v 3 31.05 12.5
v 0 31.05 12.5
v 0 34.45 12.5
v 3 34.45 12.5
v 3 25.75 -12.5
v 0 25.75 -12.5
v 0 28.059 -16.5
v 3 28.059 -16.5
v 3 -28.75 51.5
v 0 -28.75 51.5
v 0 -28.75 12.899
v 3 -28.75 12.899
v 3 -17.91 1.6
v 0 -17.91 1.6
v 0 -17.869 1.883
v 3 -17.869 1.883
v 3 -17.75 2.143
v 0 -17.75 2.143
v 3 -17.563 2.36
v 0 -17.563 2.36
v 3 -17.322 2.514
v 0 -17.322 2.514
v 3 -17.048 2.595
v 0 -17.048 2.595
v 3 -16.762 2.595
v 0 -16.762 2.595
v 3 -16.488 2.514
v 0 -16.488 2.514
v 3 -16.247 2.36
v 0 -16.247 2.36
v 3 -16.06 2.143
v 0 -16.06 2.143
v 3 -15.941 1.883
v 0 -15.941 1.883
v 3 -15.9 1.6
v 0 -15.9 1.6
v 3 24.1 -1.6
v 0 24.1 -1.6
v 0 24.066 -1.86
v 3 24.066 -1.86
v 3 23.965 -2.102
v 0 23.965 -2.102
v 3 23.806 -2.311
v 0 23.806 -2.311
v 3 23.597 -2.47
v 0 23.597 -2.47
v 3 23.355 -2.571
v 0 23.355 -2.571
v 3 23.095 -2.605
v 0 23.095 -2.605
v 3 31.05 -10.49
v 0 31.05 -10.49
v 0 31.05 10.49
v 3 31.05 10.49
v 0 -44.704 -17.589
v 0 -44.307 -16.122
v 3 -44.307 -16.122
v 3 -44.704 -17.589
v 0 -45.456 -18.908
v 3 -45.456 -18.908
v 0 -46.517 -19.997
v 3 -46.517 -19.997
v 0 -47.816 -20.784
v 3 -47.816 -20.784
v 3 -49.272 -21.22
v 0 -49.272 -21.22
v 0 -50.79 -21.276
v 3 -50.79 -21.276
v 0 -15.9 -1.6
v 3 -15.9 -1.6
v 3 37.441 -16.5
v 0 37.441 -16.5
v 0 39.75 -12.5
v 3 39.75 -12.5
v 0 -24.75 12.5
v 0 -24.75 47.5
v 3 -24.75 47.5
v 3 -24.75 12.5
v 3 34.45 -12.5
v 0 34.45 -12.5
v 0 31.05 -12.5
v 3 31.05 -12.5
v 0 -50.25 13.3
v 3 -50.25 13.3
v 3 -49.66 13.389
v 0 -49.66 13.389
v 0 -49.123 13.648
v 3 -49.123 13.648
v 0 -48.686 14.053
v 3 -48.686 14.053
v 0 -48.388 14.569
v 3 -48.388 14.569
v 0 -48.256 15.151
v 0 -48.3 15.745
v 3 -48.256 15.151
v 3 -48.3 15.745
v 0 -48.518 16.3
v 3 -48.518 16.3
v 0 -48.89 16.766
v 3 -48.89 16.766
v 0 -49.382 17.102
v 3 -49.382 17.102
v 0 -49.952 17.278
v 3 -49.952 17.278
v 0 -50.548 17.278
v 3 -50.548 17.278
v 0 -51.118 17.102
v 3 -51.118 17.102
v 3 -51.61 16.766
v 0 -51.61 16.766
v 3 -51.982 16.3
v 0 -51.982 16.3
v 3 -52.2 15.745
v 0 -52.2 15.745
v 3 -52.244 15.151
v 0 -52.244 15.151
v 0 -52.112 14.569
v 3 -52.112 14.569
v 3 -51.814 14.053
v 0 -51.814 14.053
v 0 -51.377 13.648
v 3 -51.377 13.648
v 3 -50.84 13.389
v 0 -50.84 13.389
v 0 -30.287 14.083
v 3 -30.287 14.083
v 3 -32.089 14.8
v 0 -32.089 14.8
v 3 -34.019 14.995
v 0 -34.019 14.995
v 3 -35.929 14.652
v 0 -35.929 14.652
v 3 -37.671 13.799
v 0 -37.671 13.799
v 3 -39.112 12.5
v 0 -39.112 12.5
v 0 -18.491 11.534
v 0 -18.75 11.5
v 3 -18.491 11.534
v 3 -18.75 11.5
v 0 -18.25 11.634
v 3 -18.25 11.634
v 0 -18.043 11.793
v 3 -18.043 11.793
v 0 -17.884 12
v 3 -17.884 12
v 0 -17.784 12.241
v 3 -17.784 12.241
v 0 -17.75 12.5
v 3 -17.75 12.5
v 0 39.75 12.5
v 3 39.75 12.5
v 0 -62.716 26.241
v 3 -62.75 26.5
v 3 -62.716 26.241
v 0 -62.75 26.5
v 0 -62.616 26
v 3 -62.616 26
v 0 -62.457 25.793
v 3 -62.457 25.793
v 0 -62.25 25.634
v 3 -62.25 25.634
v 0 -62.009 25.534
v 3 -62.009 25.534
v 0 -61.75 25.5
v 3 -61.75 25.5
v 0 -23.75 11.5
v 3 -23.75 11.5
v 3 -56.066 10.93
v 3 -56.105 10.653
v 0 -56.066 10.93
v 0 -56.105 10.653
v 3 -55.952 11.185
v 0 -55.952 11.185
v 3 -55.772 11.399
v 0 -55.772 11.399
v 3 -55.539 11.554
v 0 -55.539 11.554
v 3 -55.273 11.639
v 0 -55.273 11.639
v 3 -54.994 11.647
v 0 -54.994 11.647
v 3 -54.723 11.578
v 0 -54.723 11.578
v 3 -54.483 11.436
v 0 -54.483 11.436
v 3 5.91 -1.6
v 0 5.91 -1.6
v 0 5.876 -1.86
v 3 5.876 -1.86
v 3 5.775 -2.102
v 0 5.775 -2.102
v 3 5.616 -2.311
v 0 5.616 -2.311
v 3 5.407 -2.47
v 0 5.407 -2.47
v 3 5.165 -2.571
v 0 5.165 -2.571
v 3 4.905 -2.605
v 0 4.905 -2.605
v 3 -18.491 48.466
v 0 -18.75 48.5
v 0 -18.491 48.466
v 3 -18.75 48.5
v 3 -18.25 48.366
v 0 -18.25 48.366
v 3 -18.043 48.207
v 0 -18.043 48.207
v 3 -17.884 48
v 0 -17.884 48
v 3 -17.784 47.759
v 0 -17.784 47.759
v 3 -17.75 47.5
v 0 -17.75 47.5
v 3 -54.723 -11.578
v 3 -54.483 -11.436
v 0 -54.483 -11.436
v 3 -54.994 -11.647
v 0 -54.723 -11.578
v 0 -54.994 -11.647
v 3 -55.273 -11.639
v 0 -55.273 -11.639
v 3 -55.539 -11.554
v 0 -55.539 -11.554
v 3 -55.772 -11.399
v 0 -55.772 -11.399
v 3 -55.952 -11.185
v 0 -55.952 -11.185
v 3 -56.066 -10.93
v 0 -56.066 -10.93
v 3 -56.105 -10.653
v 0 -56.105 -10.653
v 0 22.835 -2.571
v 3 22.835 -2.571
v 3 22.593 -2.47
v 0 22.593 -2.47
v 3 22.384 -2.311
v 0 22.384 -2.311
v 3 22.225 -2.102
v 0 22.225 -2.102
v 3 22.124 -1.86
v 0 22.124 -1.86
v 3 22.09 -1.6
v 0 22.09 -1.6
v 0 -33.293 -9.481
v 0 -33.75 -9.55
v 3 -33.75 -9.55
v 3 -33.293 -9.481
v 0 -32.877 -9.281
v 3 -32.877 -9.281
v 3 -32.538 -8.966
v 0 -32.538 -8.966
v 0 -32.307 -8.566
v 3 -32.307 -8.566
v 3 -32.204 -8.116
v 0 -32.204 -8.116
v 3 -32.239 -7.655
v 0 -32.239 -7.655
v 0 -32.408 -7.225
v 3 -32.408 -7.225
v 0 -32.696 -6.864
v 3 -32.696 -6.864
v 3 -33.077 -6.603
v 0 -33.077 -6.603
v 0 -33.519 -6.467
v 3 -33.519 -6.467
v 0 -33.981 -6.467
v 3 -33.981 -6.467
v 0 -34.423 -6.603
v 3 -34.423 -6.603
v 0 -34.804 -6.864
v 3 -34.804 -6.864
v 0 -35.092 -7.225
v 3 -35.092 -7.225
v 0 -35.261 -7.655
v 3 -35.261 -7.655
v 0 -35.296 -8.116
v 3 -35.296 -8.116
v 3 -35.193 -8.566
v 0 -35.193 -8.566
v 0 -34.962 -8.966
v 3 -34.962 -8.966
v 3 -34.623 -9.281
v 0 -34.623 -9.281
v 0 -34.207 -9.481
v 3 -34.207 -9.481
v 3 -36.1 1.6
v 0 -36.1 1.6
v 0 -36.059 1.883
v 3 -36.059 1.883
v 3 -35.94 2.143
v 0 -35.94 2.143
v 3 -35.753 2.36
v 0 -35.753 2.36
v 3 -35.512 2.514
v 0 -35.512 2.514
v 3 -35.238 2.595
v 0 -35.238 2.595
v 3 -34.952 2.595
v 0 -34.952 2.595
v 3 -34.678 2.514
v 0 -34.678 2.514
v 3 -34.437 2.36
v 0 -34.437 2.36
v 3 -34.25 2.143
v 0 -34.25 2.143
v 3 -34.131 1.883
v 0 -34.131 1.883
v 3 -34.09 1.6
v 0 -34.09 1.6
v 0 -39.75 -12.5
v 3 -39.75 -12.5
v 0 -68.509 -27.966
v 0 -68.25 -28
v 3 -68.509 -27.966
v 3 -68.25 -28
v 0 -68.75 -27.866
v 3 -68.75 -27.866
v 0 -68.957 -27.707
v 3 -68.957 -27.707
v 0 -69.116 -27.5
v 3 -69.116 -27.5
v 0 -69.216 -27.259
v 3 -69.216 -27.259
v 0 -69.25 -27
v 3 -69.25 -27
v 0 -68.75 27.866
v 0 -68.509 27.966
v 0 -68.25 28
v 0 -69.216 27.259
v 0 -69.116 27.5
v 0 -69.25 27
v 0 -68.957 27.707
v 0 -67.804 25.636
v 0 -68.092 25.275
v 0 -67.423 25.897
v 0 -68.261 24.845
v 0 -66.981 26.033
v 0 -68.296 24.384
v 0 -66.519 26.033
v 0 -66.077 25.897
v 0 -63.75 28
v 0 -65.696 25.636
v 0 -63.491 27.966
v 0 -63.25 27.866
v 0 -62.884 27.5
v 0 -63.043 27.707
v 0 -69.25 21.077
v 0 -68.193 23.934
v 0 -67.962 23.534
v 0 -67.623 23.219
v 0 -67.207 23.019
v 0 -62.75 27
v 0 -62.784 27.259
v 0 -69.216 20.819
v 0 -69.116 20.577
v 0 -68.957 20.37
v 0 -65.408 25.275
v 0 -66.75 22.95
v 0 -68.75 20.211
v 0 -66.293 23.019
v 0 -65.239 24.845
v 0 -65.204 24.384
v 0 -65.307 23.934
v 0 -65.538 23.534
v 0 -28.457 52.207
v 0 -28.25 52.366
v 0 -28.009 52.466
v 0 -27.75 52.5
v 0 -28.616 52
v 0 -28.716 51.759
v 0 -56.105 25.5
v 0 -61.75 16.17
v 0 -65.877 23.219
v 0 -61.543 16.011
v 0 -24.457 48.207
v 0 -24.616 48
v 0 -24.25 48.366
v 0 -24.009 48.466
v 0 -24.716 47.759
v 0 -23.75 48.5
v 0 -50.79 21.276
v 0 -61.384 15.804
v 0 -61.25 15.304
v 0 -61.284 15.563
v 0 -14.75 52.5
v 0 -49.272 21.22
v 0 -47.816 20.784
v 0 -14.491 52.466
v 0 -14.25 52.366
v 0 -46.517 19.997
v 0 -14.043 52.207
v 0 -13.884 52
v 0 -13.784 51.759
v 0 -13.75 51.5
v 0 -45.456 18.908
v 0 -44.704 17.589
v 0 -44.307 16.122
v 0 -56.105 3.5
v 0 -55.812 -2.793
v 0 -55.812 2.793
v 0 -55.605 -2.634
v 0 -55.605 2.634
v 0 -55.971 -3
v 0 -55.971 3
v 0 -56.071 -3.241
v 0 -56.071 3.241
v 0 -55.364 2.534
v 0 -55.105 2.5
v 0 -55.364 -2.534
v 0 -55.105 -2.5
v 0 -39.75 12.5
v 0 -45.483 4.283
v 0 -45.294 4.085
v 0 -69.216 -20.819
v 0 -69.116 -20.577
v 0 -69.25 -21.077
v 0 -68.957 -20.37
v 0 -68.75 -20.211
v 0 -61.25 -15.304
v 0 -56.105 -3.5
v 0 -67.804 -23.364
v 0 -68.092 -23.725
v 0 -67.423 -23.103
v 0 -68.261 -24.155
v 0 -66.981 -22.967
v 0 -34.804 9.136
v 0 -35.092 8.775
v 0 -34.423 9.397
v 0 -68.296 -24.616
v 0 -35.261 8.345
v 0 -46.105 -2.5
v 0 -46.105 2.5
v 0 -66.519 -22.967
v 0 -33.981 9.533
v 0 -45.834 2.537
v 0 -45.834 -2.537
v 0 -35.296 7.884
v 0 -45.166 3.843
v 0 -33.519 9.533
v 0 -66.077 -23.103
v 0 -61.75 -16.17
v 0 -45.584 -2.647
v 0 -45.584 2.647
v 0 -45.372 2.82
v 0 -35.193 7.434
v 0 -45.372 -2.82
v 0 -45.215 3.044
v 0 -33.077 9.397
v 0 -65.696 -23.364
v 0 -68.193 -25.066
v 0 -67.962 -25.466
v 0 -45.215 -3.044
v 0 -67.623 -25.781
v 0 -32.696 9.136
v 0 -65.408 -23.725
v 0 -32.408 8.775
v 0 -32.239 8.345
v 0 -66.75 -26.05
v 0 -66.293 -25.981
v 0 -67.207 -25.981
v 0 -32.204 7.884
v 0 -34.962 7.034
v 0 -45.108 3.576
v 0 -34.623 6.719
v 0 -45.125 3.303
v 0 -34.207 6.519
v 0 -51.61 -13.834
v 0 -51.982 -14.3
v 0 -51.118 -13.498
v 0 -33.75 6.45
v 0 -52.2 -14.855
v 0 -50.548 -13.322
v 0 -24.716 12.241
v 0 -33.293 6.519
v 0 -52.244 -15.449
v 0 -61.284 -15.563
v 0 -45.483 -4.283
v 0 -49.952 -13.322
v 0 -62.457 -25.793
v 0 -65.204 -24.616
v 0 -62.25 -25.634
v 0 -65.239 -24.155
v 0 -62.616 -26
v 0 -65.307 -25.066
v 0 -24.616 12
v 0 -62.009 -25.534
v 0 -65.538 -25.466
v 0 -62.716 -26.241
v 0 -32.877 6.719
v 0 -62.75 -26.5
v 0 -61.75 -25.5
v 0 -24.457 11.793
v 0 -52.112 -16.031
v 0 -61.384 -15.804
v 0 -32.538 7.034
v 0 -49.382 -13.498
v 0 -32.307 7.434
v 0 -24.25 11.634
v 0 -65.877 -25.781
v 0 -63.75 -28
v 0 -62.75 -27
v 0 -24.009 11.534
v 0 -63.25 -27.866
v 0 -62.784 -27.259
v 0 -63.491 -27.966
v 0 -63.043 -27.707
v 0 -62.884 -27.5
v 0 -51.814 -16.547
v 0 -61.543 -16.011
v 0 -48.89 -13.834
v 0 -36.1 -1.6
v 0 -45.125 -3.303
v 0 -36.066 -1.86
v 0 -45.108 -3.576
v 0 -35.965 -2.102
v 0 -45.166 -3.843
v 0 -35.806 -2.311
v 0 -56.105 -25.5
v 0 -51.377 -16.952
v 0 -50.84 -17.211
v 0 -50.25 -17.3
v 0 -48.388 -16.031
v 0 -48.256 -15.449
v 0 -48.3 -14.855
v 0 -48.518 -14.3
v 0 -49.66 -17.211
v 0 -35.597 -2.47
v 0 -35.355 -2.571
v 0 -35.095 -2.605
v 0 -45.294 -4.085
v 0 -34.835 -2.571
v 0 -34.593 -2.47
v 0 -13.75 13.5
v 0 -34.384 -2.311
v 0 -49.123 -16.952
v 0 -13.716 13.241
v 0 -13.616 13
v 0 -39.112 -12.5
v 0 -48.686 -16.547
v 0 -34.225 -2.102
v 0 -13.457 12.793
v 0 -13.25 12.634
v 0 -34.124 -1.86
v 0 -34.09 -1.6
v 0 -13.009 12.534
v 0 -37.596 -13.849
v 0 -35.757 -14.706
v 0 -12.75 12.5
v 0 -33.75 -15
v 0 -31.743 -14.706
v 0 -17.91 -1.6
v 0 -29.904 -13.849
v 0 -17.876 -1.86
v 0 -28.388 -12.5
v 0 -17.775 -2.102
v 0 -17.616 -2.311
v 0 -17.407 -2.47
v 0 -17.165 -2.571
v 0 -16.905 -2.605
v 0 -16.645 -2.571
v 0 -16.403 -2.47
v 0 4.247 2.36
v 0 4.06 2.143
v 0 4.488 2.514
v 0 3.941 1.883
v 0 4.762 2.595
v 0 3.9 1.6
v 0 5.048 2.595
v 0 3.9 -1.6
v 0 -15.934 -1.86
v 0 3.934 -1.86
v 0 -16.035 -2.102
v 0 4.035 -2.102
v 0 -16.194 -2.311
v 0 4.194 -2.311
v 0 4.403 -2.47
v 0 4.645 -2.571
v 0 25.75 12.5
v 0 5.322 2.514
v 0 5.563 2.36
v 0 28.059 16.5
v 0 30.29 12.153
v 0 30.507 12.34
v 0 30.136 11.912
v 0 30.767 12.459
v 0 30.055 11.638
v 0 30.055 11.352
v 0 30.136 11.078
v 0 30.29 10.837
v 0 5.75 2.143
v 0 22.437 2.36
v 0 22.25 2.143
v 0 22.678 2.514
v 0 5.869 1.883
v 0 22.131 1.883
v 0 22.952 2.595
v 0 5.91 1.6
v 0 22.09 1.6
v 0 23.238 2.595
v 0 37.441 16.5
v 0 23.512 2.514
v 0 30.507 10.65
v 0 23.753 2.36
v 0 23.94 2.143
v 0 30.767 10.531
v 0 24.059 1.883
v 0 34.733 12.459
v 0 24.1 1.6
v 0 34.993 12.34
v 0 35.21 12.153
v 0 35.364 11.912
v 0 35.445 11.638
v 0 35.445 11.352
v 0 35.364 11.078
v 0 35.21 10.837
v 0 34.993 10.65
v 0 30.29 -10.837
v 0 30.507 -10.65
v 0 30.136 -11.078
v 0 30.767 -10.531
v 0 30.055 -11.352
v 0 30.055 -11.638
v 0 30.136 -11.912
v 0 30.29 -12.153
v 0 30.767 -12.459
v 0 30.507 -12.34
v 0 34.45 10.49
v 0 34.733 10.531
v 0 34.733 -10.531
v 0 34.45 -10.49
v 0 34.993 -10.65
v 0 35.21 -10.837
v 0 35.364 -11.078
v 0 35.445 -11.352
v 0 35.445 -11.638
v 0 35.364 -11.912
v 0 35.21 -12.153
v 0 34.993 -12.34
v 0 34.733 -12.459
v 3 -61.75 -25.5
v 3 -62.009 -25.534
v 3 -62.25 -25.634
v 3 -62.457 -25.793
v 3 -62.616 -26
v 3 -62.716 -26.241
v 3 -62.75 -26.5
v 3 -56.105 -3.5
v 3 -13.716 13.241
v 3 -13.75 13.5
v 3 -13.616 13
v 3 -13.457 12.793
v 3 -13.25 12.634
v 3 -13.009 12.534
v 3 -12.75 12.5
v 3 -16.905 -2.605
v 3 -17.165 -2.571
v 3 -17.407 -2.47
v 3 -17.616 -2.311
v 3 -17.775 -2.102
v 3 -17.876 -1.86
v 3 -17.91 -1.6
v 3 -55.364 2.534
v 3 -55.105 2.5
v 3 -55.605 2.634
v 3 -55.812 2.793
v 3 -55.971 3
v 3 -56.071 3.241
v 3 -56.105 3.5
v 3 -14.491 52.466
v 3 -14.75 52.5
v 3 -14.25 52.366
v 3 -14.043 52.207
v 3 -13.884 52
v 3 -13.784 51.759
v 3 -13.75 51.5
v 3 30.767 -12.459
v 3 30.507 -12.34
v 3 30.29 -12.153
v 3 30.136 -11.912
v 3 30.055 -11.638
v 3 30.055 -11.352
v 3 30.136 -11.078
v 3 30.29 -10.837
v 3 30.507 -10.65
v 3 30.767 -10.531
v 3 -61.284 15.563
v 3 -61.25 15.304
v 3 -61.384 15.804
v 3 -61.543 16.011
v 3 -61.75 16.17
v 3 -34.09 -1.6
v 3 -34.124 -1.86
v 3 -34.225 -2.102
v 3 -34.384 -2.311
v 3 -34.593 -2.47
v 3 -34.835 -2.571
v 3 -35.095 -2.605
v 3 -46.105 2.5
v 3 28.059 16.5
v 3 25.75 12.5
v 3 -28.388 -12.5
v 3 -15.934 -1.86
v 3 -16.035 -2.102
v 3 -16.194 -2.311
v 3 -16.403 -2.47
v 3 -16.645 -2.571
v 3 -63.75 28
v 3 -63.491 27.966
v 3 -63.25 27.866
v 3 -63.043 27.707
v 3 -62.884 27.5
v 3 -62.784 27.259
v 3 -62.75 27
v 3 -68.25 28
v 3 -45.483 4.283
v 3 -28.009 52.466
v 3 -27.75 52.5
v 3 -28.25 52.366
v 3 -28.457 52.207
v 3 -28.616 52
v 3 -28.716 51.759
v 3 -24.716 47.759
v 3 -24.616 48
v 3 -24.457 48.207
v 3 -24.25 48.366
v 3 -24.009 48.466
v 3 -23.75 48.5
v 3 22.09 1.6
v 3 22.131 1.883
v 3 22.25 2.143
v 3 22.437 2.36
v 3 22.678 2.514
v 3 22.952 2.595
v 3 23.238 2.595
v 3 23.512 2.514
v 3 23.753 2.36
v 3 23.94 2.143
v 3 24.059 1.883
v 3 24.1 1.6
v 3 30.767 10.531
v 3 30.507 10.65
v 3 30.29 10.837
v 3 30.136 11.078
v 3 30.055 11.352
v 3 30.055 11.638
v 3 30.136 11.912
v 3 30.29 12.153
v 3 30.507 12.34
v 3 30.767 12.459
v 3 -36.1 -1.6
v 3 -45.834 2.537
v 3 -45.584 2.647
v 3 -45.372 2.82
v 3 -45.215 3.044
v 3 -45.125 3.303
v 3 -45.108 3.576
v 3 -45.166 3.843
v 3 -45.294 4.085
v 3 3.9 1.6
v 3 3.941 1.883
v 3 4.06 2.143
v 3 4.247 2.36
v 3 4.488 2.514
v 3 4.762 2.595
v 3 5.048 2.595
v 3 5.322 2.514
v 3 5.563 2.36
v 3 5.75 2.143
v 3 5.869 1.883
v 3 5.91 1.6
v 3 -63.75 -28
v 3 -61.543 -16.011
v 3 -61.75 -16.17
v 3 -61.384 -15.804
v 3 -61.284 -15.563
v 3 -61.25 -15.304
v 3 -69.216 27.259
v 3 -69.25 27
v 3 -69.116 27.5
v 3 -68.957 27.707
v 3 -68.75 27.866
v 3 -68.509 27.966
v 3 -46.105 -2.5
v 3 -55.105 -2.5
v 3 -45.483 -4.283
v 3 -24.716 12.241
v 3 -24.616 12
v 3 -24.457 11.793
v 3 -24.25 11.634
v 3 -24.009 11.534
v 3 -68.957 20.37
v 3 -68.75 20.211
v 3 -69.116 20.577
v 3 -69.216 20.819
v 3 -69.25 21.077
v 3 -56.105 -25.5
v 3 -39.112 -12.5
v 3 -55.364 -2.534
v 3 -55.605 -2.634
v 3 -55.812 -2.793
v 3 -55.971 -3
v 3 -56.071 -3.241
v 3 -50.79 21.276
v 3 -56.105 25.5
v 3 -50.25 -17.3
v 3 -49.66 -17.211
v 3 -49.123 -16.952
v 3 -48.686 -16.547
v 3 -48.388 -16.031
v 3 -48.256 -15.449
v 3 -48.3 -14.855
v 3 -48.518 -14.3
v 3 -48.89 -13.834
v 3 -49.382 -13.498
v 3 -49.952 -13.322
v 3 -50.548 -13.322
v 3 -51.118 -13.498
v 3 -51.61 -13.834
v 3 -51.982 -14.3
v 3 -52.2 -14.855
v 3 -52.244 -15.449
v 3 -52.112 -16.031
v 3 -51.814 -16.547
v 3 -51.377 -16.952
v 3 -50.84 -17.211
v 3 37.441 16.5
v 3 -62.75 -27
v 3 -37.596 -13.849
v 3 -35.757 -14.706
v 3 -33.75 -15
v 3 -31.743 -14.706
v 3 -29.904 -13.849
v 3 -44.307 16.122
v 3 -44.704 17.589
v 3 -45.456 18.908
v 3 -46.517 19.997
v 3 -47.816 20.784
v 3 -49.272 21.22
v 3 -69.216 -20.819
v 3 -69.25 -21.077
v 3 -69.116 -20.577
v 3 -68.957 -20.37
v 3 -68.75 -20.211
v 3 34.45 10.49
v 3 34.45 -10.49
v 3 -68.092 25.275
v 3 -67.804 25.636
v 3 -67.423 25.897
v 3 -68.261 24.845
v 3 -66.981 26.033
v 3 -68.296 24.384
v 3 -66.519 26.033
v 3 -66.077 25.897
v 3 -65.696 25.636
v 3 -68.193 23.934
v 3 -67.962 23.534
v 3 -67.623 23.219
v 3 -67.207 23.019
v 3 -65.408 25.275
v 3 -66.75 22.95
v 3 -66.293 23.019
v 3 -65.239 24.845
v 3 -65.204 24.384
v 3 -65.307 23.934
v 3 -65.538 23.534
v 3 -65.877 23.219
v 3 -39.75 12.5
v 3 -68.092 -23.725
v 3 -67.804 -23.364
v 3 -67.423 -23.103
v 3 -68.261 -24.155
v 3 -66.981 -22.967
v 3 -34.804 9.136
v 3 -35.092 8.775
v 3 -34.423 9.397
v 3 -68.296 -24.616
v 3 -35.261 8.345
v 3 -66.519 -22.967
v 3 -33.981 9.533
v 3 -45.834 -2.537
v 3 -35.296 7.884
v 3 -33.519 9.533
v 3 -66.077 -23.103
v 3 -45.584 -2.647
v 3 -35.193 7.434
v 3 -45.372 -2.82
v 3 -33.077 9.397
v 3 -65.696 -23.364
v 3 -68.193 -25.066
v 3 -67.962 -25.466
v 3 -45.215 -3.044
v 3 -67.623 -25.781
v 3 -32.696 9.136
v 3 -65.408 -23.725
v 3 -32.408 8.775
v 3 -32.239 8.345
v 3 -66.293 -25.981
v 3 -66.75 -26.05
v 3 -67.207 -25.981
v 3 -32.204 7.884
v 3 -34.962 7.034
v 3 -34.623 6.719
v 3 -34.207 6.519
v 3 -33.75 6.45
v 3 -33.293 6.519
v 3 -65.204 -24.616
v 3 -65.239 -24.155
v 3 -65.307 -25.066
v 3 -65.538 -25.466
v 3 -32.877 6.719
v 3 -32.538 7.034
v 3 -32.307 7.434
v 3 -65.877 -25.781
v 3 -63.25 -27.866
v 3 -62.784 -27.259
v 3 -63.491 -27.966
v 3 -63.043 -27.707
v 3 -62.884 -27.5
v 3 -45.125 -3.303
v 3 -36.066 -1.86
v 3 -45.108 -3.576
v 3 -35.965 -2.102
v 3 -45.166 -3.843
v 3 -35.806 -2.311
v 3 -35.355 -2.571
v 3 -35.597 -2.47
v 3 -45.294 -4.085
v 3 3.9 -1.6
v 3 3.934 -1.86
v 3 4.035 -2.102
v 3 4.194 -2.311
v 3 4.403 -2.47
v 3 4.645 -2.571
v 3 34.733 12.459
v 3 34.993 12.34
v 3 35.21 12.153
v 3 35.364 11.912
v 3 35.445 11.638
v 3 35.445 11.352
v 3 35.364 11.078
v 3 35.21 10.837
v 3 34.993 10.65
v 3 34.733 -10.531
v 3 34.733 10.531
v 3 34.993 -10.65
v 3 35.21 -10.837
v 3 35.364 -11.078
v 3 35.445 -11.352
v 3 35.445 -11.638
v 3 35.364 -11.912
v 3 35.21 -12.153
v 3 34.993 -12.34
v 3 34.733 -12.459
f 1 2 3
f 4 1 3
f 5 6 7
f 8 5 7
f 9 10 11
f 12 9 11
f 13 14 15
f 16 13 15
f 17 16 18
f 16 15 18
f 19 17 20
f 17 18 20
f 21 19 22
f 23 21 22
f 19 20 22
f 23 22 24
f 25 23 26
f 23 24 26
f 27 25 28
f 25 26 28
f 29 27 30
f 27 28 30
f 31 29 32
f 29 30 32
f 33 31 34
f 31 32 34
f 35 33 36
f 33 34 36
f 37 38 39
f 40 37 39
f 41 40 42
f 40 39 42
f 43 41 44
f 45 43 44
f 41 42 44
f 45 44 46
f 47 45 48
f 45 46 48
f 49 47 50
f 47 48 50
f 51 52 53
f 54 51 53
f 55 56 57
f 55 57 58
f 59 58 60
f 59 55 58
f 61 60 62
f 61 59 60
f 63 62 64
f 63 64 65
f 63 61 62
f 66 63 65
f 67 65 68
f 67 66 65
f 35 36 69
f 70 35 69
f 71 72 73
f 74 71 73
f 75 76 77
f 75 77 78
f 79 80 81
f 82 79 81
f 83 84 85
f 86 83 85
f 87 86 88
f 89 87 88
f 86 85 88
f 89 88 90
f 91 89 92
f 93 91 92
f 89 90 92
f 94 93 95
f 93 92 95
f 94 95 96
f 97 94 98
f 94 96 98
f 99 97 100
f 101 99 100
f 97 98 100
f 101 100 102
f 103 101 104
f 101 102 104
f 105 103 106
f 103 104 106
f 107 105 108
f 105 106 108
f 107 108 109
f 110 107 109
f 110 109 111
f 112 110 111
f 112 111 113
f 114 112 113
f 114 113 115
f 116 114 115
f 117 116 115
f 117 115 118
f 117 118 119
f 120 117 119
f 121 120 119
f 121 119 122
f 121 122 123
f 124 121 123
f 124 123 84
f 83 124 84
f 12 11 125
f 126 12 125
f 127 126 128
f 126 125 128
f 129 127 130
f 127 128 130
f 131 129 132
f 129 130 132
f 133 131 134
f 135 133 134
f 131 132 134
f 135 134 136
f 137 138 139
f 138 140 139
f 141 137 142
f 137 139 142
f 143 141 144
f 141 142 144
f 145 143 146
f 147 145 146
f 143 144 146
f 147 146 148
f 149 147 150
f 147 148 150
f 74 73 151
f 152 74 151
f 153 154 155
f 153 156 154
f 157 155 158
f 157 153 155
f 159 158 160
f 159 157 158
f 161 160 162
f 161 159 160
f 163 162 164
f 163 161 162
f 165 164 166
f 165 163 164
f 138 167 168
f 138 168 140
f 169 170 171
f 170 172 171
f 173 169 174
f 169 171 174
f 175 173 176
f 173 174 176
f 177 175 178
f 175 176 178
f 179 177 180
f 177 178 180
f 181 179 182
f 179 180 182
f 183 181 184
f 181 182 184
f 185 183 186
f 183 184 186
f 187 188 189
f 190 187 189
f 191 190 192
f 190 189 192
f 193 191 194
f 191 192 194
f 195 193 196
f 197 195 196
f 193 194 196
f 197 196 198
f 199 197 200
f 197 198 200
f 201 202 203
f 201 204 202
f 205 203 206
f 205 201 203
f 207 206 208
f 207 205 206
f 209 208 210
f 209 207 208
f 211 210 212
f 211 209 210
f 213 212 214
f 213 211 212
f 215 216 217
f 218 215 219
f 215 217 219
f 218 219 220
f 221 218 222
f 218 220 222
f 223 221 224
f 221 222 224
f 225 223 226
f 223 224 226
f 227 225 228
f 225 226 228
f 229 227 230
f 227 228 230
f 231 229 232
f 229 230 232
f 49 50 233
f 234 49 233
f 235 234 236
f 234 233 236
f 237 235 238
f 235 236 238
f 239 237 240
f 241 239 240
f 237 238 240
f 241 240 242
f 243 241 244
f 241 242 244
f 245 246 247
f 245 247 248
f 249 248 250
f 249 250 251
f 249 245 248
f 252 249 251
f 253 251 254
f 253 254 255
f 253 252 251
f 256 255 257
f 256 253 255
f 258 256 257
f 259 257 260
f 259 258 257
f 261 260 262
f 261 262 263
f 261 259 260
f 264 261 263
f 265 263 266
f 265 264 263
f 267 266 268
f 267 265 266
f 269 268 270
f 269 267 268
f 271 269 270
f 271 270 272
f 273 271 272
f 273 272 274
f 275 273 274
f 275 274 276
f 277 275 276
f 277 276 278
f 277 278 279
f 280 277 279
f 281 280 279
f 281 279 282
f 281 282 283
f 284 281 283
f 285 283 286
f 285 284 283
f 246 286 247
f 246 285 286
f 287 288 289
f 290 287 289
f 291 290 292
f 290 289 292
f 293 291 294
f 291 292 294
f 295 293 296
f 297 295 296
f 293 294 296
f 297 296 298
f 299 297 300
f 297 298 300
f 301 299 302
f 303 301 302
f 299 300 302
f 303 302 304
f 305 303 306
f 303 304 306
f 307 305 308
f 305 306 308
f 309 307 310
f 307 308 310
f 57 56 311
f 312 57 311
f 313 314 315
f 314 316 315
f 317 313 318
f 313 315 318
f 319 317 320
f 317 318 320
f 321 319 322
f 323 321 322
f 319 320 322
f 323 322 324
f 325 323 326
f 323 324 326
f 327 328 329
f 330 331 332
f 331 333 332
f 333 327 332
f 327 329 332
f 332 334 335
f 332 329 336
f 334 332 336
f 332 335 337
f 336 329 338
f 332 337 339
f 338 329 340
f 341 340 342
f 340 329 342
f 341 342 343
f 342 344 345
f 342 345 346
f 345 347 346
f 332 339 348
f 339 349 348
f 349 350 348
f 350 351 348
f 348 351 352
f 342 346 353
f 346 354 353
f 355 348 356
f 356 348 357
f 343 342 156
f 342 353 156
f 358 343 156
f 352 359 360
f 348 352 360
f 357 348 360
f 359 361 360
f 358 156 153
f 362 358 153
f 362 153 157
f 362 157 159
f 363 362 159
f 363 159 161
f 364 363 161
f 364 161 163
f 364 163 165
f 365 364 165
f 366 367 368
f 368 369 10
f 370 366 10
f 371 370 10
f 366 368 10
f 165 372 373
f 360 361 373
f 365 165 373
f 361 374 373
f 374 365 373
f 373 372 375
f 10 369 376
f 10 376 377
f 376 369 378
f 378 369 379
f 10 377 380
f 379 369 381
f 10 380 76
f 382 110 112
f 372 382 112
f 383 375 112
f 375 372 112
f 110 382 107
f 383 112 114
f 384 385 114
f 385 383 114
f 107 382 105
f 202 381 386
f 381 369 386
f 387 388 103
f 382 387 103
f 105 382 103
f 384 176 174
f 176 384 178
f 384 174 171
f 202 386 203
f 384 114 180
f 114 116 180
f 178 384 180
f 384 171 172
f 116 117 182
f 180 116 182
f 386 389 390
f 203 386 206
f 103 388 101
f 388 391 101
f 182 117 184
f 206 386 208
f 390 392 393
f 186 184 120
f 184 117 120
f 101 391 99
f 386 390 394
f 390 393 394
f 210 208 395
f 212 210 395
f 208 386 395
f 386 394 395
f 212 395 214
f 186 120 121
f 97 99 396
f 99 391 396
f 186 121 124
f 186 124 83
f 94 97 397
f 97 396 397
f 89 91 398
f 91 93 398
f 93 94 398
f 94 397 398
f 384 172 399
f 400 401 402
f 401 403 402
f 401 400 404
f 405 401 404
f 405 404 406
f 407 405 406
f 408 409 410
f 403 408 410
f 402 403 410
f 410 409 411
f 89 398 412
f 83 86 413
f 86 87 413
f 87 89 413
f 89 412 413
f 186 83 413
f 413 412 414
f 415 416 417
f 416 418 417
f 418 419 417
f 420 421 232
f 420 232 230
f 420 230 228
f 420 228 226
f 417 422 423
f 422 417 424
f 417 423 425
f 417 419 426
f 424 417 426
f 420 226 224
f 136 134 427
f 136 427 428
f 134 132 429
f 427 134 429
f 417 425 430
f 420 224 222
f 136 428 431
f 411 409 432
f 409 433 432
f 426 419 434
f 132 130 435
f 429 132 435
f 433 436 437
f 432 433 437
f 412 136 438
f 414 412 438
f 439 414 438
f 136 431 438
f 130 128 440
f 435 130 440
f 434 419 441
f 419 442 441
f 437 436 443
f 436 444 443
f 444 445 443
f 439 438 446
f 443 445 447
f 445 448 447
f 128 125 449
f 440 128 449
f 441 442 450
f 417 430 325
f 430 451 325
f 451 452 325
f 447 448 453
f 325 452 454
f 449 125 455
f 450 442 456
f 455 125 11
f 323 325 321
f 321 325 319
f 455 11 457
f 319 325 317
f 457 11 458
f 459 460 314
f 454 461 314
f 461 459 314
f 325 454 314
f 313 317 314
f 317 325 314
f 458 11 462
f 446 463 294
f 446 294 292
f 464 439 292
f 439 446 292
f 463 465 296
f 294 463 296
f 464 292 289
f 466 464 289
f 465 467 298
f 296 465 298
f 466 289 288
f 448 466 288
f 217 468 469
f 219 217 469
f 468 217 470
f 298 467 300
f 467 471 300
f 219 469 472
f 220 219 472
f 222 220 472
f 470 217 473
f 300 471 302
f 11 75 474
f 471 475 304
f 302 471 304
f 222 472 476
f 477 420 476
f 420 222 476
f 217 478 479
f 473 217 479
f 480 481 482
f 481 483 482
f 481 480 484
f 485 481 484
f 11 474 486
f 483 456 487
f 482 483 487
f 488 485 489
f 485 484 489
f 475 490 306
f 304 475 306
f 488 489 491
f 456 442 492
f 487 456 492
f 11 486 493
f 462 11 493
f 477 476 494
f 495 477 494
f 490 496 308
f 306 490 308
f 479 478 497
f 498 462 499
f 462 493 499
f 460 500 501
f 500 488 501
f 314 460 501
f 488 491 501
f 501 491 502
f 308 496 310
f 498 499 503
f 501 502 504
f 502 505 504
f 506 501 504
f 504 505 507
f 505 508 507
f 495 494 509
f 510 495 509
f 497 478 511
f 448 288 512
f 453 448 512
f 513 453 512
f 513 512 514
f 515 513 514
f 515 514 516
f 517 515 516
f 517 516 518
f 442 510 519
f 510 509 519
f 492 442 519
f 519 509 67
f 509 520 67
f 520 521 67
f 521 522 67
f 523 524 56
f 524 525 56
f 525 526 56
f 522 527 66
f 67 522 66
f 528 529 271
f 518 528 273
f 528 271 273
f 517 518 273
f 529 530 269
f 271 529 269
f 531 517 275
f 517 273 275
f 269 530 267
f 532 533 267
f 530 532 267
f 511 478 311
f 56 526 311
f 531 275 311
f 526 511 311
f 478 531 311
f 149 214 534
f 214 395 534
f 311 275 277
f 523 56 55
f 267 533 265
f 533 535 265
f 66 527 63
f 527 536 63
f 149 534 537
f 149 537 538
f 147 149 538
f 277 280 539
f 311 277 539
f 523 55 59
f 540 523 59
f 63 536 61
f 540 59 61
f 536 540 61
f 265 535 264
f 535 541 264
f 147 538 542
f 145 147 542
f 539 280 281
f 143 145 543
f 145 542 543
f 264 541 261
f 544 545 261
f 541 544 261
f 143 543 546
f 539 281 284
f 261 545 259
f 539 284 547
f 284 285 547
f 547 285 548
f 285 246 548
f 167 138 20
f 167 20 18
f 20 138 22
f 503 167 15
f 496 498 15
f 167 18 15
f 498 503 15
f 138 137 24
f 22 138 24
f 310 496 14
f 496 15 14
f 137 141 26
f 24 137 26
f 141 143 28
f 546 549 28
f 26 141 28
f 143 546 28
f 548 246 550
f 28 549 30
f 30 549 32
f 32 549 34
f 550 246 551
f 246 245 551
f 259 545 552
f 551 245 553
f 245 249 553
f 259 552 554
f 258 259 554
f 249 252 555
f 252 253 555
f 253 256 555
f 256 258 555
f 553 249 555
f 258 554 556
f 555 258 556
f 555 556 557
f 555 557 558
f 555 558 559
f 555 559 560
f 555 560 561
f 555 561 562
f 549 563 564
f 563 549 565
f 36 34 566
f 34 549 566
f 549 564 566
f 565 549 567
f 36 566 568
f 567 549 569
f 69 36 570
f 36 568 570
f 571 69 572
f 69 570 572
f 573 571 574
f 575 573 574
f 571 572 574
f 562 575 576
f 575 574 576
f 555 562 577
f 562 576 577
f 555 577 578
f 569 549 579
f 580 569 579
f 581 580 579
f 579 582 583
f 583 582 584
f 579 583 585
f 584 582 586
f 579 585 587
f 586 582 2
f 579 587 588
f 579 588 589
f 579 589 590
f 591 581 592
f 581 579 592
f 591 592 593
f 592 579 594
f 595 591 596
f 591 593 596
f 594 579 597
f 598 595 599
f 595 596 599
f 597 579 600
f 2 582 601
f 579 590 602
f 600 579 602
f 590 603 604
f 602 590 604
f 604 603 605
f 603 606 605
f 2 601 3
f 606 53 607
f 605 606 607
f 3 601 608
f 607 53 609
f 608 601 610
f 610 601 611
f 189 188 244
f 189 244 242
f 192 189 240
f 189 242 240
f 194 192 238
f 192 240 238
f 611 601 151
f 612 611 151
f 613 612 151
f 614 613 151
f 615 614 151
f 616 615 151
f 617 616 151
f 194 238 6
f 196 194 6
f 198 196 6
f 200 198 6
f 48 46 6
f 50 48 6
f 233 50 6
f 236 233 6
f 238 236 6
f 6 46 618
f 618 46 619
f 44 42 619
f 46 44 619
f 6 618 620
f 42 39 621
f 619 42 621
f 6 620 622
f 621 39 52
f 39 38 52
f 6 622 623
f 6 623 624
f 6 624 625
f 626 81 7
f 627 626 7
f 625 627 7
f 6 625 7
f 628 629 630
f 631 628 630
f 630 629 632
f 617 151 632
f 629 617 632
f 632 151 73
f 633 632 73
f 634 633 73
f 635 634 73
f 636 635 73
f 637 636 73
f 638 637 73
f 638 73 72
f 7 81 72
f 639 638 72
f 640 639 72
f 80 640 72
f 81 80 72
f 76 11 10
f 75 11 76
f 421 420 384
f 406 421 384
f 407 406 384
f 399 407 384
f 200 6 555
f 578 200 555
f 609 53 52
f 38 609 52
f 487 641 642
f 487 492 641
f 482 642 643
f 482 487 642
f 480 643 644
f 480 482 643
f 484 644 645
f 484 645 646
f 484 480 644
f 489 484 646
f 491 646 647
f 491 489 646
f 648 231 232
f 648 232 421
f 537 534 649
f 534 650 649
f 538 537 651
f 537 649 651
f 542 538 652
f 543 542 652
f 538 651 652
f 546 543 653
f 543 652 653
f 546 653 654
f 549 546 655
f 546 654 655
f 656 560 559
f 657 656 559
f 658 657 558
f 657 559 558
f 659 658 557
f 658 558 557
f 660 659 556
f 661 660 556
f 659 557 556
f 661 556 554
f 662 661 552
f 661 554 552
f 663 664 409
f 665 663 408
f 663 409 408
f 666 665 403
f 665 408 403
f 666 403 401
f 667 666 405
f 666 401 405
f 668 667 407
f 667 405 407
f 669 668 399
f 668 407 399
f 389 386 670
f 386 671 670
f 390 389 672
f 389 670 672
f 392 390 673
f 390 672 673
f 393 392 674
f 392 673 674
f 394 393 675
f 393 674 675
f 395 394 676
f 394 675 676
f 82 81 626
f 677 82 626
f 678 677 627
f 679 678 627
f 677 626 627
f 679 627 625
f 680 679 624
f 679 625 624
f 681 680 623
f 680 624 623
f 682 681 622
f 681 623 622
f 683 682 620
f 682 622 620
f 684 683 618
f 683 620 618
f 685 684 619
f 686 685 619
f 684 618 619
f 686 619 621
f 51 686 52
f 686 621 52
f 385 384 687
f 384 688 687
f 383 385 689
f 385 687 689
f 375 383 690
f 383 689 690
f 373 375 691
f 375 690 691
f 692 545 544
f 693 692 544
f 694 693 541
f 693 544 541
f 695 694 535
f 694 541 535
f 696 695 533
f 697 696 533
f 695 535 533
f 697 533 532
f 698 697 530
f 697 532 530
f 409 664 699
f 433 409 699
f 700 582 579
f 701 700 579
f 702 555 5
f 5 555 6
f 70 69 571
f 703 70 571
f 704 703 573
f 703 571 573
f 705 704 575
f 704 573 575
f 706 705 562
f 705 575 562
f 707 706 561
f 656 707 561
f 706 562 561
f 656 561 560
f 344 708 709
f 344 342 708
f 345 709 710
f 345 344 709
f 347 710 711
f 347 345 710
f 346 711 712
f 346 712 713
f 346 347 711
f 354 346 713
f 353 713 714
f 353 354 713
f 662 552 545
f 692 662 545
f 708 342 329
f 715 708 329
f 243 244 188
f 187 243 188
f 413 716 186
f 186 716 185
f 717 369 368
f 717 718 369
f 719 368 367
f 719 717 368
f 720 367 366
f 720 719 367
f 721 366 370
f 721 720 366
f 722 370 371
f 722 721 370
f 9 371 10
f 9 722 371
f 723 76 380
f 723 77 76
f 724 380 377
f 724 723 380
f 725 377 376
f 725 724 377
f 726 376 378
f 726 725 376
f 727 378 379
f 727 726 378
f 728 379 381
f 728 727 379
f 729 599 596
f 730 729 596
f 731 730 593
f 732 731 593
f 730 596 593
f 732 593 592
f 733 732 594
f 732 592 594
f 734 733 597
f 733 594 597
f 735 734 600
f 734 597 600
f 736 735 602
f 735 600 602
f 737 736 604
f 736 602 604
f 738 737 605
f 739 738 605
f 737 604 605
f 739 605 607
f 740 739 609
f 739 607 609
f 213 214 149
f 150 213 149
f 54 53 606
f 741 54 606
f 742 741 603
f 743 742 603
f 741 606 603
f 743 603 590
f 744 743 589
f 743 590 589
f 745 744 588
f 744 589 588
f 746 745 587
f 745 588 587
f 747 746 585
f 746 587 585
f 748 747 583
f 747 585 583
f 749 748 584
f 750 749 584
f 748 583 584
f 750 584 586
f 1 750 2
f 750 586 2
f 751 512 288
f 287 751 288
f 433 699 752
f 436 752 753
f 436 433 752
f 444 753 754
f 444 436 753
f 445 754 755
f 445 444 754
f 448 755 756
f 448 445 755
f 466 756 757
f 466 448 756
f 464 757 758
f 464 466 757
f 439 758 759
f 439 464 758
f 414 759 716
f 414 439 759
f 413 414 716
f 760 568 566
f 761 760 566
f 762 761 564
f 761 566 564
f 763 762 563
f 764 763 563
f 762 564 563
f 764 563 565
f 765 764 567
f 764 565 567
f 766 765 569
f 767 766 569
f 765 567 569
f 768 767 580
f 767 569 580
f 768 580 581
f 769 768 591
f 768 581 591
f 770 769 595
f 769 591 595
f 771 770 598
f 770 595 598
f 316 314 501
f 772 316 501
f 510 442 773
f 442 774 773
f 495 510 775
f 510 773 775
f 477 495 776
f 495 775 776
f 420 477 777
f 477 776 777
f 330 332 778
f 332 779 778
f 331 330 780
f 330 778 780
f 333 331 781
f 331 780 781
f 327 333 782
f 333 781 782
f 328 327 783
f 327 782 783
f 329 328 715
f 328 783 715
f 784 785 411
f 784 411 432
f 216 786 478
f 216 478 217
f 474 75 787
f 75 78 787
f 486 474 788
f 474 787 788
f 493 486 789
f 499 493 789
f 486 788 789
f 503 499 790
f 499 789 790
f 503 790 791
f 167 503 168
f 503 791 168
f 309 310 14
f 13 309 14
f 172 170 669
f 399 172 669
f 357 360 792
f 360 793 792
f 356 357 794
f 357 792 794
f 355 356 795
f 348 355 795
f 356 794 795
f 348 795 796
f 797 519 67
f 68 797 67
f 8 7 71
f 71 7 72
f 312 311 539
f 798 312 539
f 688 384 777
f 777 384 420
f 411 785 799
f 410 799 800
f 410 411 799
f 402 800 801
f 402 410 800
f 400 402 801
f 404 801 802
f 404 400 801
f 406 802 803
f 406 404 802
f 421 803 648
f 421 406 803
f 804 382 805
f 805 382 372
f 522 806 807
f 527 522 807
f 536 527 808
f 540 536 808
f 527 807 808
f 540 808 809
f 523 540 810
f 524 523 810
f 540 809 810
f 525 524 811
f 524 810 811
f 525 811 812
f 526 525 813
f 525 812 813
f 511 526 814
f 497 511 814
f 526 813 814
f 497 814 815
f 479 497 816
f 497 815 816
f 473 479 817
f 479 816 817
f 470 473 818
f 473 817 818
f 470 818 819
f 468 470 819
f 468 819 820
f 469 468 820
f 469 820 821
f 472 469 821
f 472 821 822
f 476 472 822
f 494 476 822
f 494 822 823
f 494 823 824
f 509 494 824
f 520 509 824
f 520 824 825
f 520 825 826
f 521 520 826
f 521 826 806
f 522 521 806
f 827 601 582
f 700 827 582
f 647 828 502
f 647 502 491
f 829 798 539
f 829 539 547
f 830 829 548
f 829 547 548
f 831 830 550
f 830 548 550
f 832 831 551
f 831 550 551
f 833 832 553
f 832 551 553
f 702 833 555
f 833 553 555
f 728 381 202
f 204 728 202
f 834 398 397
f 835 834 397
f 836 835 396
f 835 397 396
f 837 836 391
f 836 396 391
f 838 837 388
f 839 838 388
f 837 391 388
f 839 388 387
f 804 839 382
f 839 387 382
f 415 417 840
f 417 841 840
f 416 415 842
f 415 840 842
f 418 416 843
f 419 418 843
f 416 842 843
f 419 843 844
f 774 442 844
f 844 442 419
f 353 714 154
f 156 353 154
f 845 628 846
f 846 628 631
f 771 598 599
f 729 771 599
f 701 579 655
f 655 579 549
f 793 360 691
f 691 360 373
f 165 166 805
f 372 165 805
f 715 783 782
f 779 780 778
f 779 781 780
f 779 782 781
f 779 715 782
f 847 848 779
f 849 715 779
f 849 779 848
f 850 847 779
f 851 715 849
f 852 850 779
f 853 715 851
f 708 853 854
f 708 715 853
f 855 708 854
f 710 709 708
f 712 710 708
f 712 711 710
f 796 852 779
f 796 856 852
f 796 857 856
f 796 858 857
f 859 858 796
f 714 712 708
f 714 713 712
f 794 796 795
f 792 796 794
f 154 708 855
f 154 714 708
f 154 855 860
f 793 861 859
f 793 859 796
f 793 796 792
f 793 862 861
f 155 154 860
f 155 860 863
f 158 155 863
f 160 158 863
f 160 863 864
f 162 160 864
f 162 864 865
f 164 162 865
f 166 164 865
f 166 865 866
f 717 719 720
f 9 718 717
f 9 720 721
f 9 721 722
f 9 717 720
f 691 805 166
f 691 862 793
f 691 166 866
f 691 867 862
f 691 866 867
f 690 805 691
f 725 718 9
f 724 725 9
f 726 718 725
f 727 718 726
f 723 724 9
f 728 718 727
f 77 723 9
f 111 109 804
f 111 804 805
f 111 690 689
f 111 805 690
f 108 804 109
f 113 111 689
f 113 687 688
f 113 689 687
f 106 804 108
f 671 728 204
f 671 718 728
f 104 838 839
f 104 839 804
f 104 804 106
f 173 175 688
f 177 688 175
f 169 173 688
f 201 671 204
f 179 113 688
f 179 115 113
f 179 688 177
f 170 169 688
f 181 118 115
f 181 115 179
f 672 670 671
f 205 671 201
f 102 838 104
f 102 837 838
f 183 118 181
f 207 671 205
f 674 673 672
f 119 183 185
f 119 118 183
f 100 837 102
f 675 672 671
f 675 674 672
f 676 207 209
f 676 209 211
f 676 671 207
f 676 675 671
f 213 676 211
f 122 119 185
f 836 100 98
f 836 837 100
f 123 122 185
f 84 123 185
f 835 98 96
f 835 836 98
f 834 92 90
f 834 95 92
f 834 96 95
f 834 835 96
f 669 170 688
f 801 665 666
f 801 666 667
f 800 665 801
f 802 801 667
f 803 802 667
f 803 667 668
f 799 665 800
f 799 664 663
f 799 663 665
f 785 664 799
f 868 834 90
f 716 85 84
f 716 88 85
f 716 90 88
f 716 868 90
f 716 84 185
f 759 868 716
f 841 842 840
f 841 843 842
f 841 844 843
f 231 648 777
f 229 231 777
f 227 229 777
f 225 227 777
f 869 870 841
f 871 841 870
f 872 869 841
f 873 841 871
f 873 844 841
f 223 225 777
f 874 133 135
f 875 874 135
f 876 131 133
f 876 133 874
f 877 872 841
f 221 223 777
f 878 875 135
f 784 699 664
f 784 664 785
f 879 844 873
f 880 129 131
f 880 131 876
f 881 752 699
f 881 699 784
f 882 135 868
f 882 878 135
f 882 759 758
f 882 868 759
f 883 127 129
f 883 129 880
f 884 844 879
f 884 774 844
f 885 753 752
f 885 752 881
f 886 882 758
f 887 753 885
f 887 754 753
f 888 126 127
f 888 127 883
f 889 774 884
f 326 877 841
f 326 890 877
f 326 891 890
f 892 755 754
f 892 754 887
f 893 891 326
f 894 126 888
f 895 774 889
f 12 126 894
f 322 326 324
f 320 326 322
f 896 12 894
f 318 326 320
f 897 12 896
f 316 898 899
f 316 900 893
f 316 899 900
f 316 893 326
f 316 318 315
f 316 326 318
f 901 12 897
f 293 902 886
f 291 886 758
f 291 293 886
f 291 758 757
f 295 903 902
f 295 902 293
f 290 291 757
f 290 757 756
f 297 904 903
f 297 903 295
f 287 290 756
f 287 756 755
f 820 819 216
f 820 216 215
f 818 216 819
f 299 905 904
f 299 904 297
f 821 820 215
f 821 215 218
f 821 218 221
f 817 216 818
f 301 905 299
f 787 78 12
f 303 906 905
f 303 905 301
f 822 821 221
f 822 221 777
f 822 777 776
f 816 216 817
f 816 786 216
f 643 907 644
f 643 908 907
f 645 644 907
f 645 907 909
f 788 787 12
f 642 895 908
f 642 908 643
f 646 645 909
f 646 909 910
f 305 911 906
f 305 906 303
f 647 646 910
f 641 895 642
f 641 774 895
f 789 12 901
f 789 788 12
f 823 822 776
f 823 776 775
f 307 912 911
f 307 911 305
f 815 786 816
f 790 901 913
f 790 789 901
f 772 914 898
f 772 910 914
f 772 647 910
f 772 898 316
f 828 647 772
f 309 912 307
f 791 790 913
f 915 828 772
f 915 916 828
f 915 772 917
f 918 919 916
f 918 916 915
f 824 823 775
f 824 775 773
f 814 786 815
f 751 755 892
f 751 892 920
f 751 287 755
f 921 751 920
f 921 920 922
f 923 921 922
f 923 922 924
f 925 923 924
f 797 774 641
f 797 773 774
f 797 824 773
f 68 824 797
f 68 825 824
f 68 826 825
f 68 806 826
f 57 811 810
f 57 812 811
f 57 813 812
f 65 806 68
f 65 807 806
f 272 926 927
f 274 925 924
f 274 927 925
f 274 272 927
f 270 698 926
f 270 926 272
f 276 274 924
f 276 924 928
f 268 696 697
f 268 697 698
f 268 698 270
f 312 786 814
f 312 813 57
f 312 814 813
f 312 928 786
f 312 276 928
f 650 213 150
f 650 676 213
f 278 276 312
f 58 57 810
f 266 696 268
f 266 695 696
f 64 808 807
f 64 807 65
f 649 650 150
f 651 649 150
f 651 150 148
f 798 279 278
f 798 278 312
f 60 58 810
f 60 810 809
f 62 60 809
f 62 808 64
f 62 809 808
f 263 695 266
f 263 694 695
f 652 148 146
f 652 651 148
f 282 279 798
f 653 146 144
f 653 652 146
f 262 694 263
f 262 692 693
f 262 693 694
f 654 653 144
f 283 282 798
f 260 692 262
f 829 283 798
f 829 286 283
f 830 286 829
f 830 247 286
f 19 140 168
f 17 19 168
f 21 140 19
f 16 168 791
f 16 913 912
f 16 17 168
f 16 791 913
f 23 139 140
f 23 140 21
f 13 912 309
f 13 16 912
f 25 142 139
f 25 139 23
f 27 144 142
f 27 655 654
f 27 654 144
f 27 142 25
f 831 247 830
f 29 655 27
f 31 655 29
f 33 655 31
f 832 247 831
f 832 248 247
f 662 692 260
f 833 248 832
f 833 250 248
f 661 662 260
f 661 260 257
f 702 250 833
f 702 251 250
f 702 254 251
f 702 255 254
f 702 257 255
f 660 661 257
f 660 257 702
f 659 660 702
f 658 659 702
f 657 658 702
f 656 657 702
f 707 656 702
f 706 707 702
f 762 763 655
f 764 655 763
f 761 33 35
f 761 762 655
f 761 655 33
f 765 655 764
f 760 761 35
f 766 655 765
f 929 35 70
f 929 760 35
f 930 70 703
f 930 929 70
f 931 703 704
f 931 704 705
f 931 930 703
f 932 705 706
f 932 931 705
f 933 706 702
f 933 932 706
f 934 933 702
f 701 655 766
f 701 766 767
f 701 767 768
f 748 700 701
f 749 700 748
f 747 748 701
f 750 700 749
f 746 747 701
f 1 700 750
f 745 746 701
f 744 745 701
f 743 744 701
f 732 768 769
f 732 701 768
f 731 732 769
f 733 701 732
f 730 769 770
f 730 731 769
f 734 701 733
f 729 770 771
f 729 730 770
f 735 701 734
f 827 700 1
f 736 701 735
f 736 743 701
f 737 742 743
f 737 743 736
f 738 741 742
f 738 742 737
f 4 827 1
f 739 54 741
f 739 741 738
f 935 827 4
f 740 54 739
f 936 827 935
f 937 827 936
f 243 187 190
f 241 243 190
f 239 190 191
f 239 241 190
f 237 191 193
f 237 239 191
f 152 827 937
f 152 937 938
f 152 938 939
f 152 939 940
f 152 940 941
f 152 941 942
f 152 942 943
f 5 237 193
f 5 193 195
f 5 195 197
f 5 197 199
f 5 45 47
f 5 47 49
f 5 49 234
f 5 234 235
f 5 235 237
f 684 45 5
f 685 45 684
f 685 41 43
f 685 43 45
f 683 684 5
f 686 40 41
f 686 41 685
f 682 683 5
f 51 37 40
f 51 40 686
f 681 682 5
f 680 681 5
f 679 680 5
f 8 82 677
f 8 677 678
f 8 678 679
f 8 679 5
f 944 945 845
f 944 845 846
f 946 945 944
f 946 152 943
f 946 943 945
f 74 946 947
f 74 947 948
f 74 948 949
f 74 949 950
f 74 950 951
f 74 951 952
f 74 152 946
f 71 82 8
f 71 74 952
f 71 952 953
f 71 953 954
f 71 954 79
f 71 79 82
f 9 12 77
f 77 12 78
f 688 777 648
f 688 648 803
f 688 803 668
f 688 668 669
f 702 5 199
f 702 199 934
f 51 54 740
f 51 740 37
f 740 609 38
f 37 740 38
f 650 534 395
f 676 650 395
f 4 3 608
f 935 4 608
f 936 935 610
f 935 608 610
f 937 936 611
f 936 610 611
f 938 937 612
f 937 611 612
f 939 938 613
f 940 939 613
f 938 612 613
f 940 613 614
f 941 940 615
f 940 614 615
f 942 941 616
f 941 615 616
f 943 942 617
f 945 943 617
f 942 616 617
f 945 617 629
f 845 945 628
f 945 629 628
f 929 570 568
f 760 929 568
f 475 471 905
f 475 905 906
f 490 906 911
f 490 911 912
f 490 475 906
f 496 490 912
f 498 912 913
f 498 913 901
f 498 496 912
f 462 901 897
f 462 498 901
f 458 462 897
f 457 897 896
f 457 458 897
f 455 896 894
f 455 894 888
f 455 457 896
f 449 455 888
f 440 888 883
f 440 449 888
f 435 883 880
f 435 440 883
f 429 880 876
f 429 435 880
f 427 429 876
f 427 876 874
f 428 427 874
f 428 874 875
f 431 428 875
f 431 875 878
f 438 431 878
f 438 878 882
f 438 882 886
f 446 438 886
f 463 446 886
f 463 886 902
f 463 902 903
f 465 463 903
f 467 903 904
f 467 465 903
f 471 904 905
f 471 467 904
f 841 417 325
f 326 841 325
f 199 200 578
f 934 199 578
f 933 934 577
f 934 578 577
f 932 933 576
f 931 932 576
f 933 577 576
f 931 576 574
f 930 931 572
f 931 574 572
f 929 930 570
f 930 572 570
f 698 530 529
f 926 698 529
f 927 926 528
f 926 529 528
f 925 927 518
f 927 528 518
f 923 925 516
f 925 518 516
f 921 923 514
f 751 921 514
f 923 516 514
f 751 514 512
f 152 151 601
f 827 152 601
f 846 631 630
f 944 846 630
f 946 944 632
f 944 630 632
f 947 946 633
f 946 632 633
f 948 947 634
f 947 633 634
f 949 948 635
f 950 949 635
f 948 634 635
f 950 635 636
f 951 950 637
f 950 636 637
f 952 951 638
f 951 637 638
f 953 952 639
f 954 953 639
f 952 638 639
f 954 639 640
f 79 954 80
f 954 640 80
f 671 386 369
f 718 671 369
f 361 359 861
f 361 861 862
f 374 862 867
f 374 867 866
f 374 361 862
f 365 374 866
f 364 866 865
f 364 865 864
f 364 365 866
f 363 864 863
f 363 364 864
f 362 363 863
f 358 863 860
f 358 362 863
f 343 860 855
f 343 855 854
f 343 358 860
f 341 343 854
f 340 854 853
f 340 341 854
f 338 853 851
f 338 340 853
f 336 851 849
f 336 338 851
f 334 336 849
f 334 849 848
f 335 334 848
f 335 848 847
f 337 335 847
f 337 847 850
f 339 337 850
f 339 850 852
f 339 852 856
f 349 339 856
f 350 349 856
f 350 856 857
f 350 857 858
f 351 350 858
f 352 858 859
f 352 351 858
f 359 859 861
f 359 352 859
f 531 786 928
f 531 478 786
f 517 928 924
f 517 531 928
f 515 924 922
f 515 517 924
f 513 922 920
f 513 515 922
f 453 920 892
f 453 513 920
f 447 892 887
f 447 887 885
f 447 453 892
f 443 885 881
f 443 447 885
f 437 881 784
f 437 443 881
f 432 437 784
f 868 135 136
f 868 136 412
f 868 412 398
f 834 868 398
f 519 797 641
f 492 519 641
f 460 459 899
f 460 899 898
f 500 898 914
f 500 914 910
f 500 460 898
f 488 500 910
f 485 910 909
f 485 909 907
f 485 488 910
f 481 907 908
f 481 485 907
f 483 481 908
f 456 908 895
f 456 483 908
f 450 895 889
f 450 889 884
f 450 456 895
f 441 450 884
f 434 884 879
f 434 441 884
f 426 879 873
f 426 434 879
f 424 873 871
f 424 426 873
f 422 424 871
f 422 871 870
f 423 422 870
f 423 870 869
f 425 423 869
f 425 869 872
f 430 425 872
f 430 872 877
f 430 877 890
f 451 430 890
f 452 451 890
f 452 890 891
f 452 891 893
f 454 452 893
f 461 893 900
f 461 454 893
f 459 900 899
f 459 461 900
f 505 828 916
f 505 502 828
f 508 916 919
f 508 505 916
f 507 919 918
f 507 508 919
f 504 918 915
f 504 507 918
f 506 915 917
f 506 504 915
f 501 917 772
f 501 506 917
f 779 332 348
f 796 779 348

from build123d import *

# Parameters (mm, degrees)
SKETCH_1_R          = 1.55
SKETCH_1_W          = 37
SKETCH_1_H          = 7
EXTRUDE_1_DEPTH     = 3
SKETCH_2_R          = 2
CUT_EXTRUDE_1_DEPTH = 10
EXTRUDE_START       = -3
SKETCH_3_R          = 1.55
EXTRUDE_2_DEPTH     = 3
FILLET_1_R          = 1


with BuildPart() as part:
    # 草图1 → 凸台-拉伸1 (new body)
    # profile 1 of 2: a face of its own
    with BuildSketch(Plane(origin=(0, 0, 0), x_dir=(0, 0, -1), z_dir=(1, 0, 0))):
        Polygon((28, -59.25), (12.5, -39.75), (-12.5, -39.75), (-28, -59.25), (-28, -69.25), (-20.5, -69.25), (-15.881197846, -61.25), (15.881197846, -61.25), (20.5, -69.25), (28, -69.25), align=None)
        with Locations((-24.5, -66.75)):
            Circle(SKETCH_1_R, mode=Mode.SUBTRACT)
        with Locations((24.5, -66.75)):
            Circle(SKETCH_1_R, mode=Mode.SUBTRACT)
    # profile 2 of 2: a face of its own
    with BuildSketch(Plane(origin=(0, 0, 0), x_dir=(0, 0, -1), z_dir=(1, 0, 0))):
        Polygon((-12.5, -39.75), (12.5, -39.75), (12.5, -28.75), (12.5, -13.75), (12.5, 25.75), (16.5, 28.059401077), (16.5, 37.440598923), (12.5, 39.75), (-12.5, 39.75), (-16.5, 37.440598923), (-16.5, 28.059401077), (-12.5, 25.75), (-12.5, -13.75), (-52.5, -13.75), (-52.5, -28.75), (-12.5, -28.75), align=None)
        with Locations((-30, -21.25)):
            Rectangle(SKETCH_1_W, SKETCH_1_H, mode=Mode.SUBTRACT)
        with Locations((-8, -33.75)):
            Circle(SKETCH_1_R, mode=Mode.SUBTRACT)
        with BuildLine():
            ThreePointArc((2.605, -35.095), (2.310642315, -35.805642315), (1.6, -36.1))
            Line((1.6, -36.1), (-1.6, -36.1))
            ThreePointArc((-1.6, -36.1), (-2.605, -35.095), (-1.6, -34.09))
            Line((-1.6, -34.09), (-1.6, -17.91))
            ThreePointArc((-1.6, -17.91), (-2.605, -16.905), (-1.6, -15.9))
            Line((-1.6, -15.9), (1.6, -15.9))
            ThreePointArc((1.6, -15.9), (2.310642315, -16.194357685), (2.605, -16.905))
            ThreePointArc((2.605, -16.905), (2.310642315, -17.615642315), (1.6, -17.91))
            Line((1.6, -17.91), (1.6, -34.09))
            ThreePointArc((1.6, -34.09), (2.310642315, -34.384357685), (2.605, -35.095))
        make_face(mode=Mode.SUBTRACT)
        with Locations((8, -33.75)):
            Circle(SKETCH_1_R, mode=Mode.SUBTRACT)
        with BuildLine():
            ThreePointArc((2.605, 4.905), (2.310642315, 4.194357685), (1.6, 3.9))
            Line((1.6, 3.9), (-1.6, 3.9))
            ThreePointArc((-1.6, 3.9), (-2.605, 4.905), (-1.6, 5.91))
            Line((-1.6, 5.91), (-1.6, 22.09))
            ThreePointArc((-1.6, 22.09), (-2.605, 23.095), (-1.6, 24.1))
            Line((-1.6, 24.1), (1.6, 24.1))
            ThreePointArc((1.6, 24.1), (2.310642315, 23.805642315), (2.605, 23.095))
            ThreePointArc((2.605, 23.095), (2.310642315, 22.384357685), (1.6, 22.09))
            Line((1.6, 22.09), (1.6, 5.91))
            ThreePointArc((1.6, 5.91), (2.310642315, 5.615642315), (2.605, 4.905))
        make_face(mode=Mode.SUBTRACT)
        with BuildLine():
            Line((10.49, 31.05), (-10.49, 31.05))
            ThreePointArc((-10.49, 31.05), (-11.495, 30.045), (-12.5, 31.05))
            Line((-12.5, 31.05), (-12.5, 34.45))
            ThreePointArc((-12.5, 34.45), (-11.495, 35.455), (-10.49, 34.45))
            Line((-10.49, 34.45), (10.49, 34.45))
            ThreePointArc((10.49, 34.45), (11.495, 35.455), (12.5, 34.45))
            Line((12.5, 34.45), (12.5, 31.05))
            ThreePointArc((12.5, 31.05), (11.495, 30.045), (10.49, 31.05))
        make_face(mode=Mode.SUBTRACT)
    extrude(amount=EXTRUDE_1_DEPTH)

    # 草图2 → 切除-拉伸1 (cut)
    with BuildSketch(Plane(origin=(3, 0, 0), x_dir=(0, 0, -1), z_dir=(1, 0, 0))):
        with Locations((15.3, -50.25)):
            Circle(SKETCH_2_R)
        with Locations((-15.3, -50.25)):
            Circle(SKETCH_2_R)
        Polygon((33.5, -57.75), (33.5, -62.75), (25.5, -62.75), (25.5, -57.75), (25.5, -56.10483871), (33.5, -56.10483871), align=None)
        Polygon((-33.5, -62.75), (-25.5, -62.75), (-25.5, -57.75), (-25.5, -56.10483871), (-33.5, -56.10483871), (-33.5, -57.75), align=None)
        Polygon((12.725724403, -56.10483871), (2.5, -56.10483871), (2.5, -43.240217687), align=None)
        Polygon((-2.5, -56.10483871), (-2.5, -43.240217687), (-12.725724403, -56.10483871), align=None)
    extrude(amount=-CUT_EXTRUDE_1_DEPTH, mode=Mode.SUBTRACT)

    # 草图3 → 凸台-拉伸2 (add)
    # profile 1 of 4: a face of its own
    with BuildSketch(Plane(origin=(3, 0, 0), x_dir=(0, 0, -1), z_dir=(1, 0, 0)).offset(EXTRUDE_START)):
        with BuildLine():
            Line((-3.757359313, -27.75), (-11.605551275, -27.75))
            ThreePointArc((-11.605551275, -27.75), (-13.792647393, -37.680042771), (-3.757359313, -39.317764363))
            Line((-3.757359313, -39.317764363), (-3.757359313, -27.75))
        make_face()
        with Locations((-8, -33.75)):
            Circle(SKETCH_3_R, mode=Mode.SUBTRACT)
    # profile 2 of 4: a face of its own
    with BuildSketch(Plane(origin=(3, 0, 0), x_dir=(0, 0, -1), z_dir=(1, 0, 0)).offset(EXTRUDE_START)):
        with BuildLine():
            Line((11.605551275, -27.75), (3.757359313, -27.75))
            Line((3.757359313, -27.75), (3.757359313, -39.317764363))
            ThreePointArc((3.757359313, -39.317764363), (13.792647393, -37.680042771), (11.605551275, -27.75))
        make_face()
        with Locations((8, -33.75)):
            Circle(SKETCH_3_R, mode=Mode.SUBTRACT)
    # profile 3 of 4: a face of its own
    with BuildSketch(Plane(origin=(3, 0, 0), x_dir=(0, 0, -1), z_dir=(1, 0, 0)).offset(EXTRUDE_START)):
        with BuildLine():
            Line((-21.275623434, -50.790300449), (-16.121878581, -44.306556924))
            ThreePointArc((-16.121878581, -44.306556924), (-19.996939529, -46.516535247), (-21.275623434, -50.790300449))
        make_face()
    # profile 4 of 4: a face of its own
    with BuildSketch(Plane(origin=(3, 0, 0), x_dir=(0, 0, -1), z_dir=(1, 0, 0)).offset(EXTRUDE_START)):
        with BuildLine():
            Line((21.275623434, -50.790300449), (16.121878581, -44.306556924))
            ThreePointArc((16.121878581, -44.306556924), (19.996939529, -46.516535247), (21.275623434, -50.790300449))
        make_face()
    extrude(amount=EXTRUDE_2_DEPTH)

    # 圆角1
    fillet_1_edges = [part.edges().sort_by_distance(p)[0] for p in [
        (1.5, -17.75, 48.5),
        (1.5, -24.75, 48.5),
        (1.5, -24.75, 11.5),
        (1.5, -17.75, 11.5),
        (1.5, -62.75, -25.5),
        (1.5, -62.75, -28),
        (1.5, -56.10483871, 12.725724403),
        (1.5, -43.240217687, 2.5),
        (1.5, -56.10483871, 2.5),
        (1.5, -62.75, 28),
        (1.5, -62.75, 25.5),
        (1.5, -43.240217687, -2.5),
        (1.5, -56.10483871, -12.725724403),
        (1.5, -56.10483871, -2.5),
        (1.5, -69.25, -28),
        (1.5, -69.25, -20.5),
        (1.5, -61.25, -15.881197846),
        (1.5, -61.25, 15.881197846),
        (1.5, -69.25, 20.5),
        (1.5, -69.25, 28),
        (1.5, -28.75, 52.5),
        (1.5, -13.75, 52.5),
        (1.5, -13.75, 12.5),
    ]]
    fillet(fillet_1_edges, radius=FILLET_1_R)


solid = part.part
